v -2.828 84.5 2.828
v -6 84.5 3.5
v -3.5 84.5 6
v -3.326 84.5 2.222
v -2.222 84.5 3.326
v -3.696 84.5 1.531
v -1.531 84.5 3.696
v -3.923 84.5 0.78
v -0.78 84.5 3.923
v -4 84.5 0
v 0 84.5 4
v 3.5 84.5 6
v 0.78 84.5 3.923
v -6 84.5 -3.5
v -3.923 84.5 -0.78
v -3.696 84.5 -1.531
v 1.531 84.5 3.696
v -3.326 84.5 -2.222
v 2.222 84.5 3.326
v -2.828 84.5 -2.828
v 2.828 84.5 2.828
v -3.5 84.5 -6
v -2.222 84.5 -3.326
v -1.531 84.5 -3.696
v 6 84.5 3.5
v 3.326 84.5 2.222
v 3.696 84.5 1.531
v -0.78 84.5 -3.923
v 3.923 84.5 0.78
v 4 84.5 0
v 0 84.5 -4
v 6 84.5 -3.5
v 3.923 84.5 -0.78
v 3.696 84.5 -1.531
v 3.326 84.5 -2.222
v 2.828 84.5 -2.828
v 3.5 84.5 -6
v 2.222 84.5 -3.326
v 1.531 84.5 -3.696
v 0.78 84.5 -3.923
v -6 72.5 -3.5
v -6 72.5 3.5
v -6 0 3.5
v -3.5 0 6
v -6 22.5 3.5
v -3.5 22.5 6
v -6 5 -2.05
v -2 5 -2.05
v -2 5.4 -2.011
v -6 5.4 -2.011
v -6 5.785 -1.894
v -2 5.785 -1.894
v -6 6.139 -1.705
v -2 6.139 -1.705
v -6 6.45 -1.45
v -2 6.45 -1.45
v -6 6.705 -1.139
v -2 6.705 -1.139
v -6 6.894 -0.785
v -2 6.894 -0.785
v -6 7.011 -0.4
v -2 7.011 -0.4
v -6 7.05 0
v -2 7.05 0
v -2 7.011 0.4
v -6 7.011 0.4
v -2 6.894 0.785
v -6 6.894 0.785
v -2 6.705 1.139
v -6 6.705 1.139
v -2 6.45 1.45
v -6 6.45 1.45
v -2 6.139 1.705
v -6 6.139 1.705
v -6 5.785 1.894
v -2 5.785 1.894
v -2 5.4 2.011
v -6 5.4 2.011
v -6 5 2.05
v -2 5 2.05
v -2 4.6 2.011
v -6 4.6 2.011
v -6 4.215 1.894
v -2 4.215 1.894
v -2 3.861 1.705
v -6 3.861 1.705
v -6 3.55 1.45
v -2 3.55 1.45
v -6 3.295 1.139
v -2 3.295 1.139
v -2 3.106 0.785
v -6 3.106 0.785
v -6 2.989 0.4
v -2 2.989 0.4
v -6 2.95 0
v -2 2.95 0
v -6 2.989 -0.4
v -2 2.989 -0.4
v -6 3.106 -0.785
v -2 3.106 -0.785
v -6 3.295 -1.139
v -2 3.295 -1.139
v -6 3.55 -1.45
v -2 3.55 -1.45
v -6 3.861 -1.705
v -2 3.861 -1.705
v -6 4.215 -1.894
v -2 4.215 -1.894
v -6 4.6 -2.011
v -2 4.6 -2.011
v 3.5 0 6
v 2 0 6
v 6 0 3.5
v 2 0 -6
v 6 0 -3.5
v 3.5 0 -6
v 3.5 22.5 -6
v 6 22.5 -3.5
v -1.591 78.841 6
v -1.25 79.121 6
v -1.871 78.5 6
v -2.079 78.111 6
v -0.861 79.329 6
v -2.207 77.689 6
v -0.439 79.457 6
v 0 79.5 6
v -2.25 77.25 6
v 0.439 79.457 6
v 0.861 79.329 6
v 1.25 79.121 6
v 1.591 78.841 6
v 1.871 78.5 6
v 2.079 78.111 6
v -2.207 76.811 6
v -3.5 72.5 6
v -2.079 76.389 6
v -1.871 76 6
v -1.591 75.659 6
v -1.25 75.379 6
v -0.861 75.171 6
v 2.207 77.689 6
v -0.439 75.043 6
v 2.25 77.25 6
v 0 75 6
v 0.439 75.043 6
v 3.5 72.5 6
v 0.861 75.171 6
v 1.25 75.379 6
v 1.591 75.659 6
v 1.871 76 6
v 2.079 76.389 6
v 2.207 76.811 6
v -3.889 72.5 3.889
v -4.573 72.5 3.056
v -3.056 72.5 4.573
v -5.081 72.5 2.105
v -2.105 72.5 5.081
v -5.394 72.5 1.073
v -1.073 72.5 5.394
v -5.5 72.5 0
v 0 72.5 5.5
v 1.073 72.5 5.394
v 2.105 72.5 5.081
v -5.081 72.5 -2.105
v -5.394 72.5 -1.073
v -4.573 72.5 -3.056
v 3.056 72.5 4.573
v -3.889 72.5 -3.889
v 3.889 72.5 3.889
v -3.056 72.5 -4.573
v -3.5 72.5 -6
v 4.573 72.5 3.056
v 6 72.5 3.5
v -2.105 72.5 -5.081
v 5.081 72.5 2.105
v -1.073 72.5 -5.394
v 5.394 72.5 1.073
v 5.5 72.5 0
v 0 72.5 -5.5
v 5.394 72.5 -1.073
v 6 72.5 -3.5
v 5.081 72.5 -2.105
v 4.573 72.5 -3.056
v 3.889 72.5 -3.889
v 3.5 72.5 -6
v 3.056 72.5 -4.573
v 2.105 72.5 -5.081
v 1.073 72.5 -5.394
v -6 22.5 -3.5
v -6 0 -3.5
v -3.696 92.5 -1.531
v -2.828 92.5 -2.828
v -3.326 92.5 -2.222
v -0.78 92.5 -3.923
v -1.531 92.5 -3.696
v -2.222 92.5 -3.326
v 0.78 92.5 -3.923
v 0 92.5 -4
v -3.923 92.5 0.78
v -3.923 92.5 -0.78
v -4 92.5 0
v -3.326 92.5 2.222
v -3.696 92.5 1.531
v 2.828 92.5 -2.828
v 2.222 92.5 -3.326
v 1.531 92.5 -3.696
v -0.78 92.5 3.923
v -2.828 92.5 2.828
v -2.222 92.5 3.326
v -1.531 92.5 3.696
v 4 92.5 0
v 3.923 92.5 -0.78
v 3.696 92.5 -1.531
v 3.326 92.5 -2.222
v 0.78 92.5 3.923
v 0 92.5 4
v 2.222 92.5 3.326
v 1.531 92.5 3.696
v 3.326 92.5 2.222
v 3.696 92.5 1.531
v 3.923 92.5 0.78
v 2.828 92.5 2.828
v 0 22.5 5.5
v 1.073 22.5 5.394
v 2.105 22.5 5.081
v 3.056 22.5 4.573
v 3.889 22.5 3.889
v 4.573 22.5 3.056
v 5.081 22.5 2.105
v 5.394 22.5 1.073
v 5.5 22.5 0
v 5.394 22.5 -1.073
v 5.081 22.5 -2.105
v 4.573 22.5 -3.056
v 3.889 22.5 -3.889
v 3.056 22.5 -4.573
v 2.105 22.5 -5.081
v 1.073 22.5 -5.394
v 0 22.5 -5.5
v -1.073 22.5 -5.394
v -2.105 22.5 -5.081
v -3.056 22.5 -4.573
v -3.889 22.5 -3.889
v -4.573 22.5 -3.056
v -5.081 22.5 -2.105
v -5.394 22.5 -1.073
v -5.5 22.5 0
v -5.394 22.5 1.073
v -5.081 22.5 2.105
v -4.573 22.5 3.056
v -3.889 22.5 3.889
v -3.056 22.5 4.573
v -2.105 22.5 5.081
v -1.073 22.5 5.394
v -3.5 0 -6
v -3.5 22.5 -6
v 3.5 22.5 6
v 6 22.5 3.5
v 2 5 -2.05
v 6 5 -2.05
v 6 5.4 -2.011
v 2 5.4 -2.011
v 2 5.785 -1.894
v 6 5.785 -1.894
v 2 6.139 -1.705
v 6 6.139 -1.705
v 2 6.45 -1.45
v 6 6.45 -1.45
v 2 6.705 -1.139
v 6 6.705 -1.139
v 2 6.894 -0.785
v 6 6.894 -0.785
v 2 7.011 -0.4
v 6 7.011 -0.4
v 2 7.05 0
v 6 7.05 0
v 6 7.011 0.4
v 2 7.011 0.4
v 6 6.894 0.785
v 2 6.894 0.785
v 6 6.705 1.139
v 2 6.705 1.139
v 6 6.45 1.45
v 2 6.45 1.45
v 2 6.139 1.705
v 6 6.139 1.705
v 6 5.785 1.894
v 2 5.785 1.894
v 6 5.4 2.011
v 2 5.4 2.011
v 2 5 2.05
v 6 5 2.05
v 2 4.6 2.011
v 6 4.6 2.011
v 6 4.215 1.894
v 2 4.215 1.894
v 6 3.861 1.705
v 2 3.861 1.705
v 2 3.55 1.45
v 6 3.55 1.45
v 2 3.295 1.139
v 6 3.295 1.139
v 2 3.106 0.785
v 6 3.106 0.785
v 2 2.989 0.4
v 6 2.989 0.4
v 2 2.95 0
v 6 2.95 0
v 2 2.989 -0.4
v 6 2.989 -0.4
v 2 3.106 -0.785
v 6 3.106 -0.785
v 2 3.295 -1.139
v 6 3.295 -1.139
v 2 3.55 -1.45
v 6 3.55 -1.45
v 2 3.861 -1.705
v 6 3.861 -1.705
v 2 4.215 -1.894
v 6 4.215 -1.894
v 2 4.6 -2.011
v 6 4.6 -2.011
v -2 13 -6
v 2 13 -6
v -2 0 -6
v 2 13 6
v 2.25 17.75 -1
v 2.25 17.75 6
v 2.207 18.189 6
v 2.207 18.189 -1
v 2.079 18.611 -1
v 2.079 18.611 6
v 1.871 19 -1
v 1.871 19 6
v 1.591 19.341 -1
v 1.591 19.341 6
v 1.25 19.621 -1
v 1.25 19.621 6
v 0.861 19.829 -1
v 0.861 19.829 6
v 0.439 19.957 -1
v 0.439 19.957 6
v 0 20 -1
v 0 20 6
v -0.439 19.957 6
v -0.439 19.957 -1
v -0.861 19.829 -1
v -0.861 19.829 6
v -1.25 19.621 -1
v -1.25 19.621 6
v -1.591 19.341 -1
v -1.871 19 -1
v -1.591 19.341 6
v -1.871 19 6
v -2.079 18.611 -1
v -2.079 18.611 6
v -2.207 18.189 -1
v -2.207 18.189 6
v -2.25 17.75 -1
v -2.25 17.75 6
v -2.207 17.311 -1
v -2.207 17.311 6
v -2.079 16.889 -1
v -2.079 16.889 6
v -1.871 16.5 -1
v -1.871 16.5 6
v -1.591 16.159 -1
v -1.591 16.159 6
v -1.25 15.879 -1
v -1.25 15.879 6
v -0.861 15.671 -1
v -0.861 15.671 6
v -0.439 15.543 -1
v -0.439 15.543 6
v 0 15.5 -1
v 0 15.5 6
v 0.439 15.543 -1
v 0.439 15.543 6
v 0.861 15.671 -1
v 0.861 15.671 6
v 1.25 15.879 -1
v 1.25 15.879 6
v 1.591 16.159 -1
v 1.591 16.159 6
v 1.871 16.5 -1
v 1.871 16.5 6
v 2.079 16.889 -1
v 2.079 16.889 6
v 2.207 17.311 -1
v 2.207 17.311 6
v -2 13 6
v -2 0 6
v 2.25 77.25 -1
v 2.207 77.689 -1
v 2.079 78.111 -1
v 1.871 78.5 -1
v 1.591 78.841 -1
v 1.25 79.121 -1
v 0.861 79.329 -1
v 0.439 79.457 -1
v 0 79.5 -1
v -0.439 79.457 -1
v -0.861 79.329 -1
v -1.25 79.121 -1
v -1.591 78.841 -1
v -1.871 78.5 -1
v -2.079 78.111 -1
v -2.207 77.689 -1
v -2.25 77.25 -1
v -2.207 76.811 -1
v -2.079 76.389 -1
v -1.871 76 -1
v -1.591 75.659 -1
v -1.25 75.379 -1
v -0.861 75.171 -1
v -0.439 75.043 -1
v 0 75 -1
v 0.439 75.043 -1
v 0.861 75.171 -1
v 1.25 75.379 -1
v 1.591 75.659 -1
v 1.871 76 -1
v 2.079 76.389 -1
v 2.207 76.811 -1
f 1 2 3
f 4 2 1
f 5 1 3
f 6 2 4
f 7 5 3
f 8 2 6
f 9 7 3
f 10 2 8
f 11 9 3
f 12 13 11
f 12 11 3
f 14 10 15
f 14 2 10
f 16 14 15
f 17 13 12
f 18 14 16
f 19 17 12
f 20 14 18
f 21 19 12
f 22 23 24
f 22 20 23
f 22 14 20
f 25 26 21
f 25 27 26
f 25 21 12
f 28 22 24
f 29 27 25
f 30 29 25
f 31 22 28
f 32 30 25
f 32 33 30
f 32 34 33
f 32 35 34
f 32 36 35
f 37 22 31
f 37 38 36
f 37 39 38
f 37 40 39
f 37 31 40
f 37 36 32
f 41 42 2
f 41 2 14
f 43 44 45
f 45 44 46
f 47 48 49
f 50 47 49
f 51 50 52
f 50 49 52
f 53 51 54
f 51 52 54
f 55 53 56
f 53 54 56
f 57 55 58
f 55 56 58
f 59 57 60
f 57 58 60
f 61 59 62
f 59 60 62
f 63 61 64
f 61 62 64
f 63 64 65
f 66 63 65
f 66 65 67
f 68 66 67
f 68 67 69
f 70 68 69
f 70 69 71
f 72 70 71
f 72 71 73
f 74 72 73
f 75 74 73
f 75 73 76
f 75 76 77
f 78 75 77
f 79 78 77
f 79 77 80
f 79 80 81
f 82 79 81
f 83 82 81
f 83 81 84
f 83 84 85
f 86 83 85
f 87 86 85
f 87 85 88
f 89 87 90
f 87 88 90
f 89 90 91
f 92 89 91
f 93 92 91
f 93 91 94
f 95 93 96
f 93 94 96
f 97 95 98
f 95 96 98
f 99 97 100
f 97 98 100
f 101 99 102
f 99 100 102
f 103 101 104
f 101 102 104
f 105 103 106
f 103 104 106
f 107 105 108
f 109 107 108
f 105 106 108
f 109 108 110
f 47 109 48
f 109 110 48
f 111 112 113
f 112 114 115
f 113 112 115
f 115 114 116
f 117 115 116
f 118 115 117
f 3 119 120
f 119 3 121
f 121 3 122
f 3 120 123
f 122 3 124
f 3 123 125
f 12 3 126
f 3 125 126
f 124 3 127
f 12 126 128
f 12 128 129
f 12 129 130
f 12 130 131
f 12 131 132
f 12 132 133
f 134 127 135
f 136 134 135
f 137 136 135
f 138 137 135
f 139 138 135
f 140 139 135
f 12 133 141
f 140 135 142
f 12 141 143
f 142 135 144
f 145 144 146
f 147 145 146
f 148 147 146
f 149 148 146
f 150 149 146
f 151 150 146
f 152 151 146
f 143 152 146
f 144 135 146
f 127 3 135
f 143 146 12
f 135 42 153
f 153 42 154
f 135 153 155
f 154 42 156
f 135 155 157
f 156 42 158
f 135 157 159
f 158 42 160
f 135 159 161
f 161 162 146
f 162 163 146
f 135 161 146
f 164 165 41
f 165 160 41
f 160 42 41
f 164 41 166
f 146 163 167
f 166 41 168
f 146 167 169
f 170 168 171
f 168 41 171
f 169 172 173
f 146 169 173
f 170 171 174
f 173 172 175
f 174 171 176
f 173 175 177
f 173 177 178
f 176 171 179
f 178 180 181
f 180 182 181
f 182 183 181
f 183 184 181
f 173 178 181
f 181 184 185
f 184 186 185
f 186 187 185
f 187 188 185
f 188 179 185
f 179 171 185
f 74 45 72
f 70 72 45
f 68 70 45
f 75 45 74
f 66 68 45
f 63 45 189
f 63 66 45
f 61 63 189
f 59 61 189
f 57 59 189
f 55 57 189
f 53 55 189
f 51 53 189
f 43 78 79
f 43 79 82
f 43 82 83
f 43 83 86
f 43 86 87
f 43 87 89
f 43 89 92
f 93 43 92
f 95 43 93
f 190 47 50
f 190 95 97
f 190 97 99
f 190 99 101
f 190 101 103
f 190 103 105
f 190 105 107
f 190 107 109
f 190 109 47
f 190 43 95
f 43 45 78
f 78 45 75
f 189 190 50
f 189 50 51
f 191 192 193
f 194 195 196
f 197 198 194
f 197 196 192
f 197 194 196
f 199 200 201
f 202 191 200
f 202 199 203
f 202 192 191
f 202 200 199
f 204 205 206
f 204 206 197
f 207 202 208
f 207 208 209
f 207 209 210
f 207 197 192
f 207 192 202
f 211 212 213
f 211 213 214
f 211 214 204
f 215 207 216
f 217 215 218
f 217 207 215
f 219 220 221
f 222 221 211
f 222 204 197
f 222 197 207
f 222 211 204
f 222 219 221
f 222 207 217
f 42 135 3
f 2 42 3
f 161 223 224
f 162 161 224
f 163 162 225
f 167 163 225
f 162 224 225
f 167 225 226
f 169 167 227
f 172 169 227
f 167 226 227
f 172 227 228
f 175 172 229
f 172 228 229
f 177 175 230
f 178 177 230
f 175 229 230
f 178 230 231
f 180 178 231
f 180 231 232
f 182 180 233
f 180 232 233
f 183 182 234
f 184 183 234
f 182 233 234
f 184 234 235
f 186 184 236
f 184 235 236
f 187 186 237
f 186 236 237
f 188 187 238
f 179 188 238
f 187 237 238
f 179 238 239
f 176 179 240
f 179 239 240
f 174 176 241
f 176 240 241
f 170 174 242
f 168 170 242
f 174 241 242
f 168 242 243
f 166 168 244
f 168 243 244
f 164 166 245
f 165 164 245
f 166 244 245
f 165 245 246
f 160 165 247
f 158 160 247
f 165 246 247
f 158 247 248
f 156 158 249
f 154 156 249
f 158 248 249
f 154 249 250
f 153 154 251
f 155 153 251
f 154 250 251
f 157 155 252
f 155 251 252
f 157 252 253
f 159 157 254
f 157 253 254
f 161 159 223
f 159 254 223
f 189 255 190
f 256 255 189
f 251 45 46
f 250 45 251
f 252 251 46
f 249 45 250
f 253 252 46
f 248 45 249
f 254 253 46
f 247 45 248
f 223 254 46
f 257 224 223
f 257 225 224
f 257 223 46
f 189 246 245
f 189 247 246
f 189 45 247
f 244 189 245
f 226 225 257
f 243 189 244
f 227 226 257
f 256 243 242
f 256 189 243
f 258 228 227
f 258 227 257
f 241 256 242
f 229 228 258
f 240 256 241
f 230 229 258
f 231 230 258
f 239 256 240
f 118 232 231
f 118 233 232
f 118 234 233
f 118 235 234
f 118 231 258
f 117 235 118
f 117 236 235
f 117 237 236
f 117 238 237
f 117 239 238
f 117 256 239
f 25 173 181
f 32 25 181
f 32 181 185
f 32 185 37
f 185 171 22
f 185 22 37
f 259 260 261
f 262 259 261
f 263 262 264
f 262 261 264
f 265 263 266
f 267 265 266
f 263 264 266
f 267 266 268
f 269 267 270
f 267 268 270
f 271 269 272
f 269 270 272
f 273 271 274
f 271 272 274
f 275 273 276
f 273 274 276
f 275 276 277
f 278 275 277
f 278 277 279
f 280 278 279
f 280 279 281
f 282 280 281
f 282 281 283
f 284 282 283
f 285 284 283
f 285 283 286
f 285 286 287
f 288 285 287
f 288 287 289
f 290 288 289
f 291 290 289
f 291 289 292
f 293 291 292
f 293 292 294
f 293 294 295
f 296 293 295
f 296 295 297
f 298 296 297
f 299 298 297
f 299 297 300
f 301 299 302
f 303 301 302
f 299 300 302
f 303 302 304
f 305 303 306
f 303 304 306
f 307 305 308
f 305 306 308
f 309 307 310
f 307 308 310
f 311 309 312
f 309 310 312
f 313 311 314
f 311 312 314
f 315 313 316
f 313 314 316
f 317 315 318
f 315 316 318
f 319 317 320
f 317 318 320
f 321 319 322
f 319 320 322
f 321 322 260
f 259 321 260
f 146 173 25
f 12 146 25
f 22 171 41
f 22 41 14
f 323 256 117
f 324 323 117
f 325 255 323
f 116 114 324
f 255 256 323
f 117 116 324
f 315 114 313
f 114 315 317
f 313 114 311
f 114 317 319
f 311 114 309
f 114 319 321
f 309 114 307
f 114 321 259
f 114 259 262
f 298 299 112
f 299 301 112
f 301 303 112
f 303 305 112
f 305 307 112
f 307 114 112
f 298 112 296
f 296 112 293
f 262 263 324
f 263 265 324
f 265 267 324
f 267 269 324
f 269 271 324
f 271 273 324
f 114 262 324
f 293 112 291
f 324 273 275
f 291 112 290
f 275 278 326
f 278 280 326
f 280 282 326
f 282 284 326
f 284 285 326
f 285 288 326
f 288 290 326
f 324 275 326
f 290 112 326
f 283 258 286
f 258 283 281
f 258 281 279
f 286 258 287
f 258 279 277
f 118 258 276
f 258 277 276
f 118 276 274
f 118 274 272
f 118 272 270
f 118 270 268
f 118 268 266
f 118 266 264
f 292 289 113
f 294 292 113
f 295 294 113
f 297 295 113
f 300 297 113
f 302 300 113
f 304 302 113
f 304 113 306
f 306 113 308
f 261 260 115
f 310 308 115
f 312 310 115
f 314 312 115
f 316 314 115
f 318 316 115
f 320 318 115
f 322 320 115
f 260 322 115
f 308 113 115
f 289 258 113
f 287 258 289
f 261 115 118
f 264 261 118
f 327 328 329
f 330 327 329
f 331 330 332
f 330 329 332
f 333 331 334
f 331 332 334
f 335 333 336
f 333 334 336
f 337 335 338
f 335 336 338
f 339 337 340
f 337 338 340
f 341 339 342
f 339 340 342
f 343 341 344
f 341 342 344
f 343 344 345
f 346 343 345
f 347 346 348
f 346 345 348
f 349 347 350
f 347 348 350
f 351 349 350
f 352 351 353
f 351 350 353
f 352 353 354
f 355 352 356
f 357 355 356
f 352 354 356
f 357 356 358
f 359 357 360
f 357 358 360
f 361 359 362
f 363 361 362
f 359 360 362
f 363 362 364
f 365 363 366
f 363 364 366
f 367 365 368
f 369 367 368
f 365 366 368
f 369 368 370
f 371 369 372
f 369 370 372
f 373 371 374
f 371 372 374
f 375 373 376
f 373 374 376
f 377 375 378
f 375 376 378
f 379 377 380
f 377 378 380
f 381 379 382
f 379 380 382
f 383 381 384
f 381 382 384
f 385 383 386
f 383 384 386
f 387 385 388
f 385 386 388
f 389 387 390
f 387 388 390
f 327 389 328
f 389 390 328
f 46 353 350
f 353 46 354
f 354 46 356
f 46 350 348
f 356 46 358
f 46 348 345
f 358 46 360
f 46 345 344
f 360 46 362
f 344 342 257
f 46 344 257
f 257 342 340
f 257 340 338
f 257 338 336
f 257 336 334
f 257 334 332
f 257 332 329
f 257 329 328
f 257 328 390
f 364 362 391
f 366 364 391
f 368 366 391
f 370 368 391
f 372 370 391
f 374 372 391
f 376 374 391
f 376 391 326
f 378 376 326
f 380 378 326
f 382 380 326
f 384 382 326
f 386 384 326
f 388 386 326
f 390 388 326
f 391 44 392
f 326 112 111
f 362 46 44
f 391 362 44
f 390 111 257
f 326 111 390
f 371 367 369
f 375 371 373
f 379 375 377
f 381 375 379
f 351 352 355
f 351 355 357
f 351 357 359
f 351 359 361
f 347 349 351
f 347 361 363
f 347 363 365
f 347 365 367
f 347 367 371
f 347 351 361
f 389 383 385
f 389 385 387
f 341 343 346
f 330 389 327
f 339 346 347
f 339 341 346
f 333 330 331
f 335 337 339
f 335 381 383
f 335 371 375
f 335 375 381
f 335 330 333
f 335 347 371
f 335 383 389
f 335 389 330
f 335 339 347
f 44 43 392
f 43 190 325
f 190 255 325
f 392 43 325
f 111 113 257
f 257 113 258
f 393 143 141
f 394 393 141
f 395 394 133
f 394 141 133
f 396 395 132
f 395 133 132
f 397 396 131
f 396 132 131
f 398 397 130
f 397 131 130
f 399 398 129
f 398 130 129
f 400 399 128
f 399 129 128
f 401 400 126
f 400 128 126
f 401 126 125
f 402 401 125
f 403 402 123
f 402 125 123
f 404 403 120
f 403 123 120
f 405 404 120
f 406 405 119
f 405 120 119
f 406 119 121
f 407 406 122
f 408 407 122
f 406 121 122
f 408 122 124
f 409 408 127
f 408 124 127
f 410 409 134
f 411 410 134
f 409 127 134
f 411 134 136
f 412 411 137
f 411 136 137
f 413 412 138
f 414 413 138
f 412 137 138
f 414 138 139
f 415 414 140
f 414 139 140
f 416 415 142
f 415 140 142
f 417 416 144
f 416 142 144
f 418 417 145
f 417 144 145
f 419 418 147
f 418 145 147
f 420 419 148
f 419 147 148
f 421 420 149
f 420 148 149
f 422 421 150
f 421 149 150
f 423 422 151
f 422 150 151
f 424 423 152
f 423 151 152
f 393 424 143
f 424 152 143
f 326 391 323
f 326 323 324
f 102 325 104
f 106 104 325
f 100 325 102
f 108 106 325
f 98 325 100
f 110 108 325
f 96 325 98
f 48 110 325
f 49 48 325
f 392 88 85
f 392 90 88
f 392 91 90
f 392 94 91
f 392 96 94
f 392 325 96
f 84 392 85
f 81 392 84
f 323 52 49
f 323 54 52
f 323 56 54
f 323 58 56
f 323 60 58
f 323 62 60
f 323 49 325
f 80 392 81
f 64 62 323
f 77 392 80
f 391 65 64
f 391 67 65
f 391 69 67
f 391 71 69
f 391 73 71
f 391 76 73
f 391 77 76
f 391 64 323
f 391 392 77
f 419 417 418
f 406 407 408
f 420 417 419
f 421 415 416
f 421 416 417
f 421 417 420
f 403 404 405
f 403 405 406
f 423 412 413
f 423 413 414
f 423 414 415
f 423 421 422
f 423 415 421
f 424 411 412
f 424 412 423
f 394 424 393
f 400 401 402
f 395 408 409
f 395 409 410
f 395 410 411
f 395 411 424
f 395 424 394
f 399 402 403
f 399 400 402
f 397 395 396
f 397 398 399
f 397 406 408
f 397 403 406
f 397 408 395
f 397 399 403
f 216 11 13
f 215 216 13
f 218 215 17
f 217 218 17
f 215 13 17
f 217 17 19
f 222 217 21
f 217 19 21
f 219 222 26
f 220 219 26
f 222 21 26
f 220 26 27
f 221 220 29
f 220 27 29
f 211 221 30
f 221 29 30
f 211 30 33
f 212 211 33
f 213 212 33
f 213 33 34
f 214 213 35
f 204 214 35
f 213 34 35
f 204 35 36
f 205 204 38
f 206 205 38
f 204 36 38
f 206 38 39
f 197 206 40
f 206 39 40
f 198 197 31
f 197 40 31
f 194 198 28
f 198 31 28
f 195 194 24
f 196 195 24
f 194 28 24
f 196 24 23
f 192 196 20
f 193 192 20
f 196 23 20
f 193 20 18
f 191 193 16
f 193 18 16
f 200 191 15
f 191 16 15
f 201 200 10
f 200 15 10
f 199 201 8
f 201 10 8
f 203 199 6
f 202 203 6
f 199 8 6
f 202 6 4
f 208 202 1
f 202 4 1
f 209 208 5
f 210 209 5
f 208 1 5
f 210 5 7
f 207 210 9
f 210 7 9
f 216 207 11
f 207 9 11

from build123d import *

# Parameters (mm, degrees)
SKETCH1_W           = 11.999999876
SKETCH1_H           = 11.999999876
BOSS_EXTRUDE1_DEPTH = 22.499999958
SKETCH2_R           = 5.499999922
BOSS_EXTRUDE2_DEPTH = 50.000000076
SKETCH3_W           = 11.999999876
SKETCH3_H           = 11.999999876
BOSS_EXTRUDE3_DEPTH = 11.999999876
SKETCH4_R           = 4.000000128
BOSS_EXTRUDE4_DEPTH = 8.000000002
CHAMFER1_SIZE       = 2.50000008
CHAMFER2_SIZE       = 2.50000008
SKETCH5_W           = 4.000000128
SKETCH5_H           = 12.999999908
CUT_EXTRUDE1_DEPTH  = 94.467908824
SKETCH6_R           = 2.049999964
CUT_EXTRUDE2_DEPTH  = 94.467908824
SKETCH7_R           = 2.250000072
CUT_EXTRUDE3_DEPTH  = 6.99999997
SKETCH8_R           = 2.250000072
CUT_EXTRUDE4_DEPTH  = 6.99999997


with BuildPart() as part:
    # Sketch1 → Boss-Extrude1 (new body)
    with BuildSketch(Plane(origin=(0, 0, 0), x_dir=(1, 0, 0), z_dir=(0, 1, 0))):
        Rectangle(SKETCH1_W, SKETCH1_H)
    extrude(amount=BOSS_EXTRUDE1_DEPTH)

    # Sketch2 → Boss-Extrude2 (add)
    with BuildSketch(Plane(origin=(0, 22.499999958, 0), x_dir=(1, 0, 0), z_dir=(0, 1, 0))):
        with Locations(Location((0, 0, 0), (0, 0, 270))):
            Circle(SKETCH2_R)
    extrude(amount=BOSS_EXTRUDE2_DEPTH)

    # Sketch3 → Boss-Extrude3 (add)
    with BuildSketch(Plane(origin=(0, 72.500000034, 0), x_dir=(1, 0, 0), z_dir=(0, 1, 0))):
        Rectangle(SKETCH3_W, SKETCH3_H)
    extrude(amount=BOSS_EXTRUDE3_DEPTH)

    # Sketch4 → Boss-Extrude4 (add)
    with BuildSketch(Plane(origin=(0, 84.49999991, 0), x_dir=(1, 0, 0), z_dir=(0, 1, 0))):
        with Locations(Location((0, 0, 0), (0, 0, 270))):
            Circle(SKETCH4_R)
    extrude(amount=BOSS_EXTRUDE4_DEPTH)

    # Chamfer1
    chamfer1_edges = [part.edges().sort_by_distance(p)[0] for p in [
        (5.999999938, 11.249999979, 5.999999938),
        (-5.999999938, 11.249999979, 5.999999938),
        (-5.999999938, 11.249999979, -5.999999938),
        (5.999999938, 11.249999979, -5.999999938),
    ]]
    chamfer(chamfer1_edges, length=CHAMFER1_SIZE)

    # Chamfer2
    chamfer2_edges = [part.edges().sort_by_distance(p)[0] for p in [
        (5.999999938, 78.499999972, 5.999999938),
        (5.999999938, 78.499999972, -5.999999938),
        (-5.999999938, 78.499999972, -5.999999938),
        (-5.999999938, 78.499999972, 5.999999938),
    ]]
    chamfer(chamfer2_edges, length=CHAMFER2_SIZE)

    # Sketch5 → Cut-Extrude1 (cut, through all)
    with BuildSketch(Plane.XY.offset(5.999999938)):
        with Locations((0, 6.499999954)):
            Rectangle(SKETCH5_W, SKETCH5_H)
    extrude(amount=-CUT_EXTRUDE1_DEPTH, mode=Mode.SUBTRACT)

    # Sketch6 → Cut-Extrude2 (cut, through all)
    with BuildSketch(Plane(origin=(5.999999938, 0, 0), x_dir=(0, 0, -1), z_dir=(1, 0, 0))):
        with Locations((0, 4.999999906)):
            Circle(SKETCH6_R)
    extrude(amount=-CUT_EXTRUDE2_DEPTH, mode=Mode.SUBTRACT)

    # Sketch7 → Cut-Extrude3 (cut)
    with BuildSketch(Plane.XY.offset(5.999999938)):
        with Locations((0, 17.749999806)):
            Circle(SKETCH7_R)
    extrude(amount=-CUT_EXTRUDE3_DEPTH, mode=Mode.SUBTRACT)

    # Sketch8 → Cut-Extrude4 (cut)
    with BuildSketch(Plane.XY.offset(5.999999938)):
        with Locations((0, 77.249999932)):
            Circle(SKETCH8_R)
    extrude(amount=-CUT_EXTRUDE4_DEPTH, mode=Mode.SUBTRACT)


solid = part.part
